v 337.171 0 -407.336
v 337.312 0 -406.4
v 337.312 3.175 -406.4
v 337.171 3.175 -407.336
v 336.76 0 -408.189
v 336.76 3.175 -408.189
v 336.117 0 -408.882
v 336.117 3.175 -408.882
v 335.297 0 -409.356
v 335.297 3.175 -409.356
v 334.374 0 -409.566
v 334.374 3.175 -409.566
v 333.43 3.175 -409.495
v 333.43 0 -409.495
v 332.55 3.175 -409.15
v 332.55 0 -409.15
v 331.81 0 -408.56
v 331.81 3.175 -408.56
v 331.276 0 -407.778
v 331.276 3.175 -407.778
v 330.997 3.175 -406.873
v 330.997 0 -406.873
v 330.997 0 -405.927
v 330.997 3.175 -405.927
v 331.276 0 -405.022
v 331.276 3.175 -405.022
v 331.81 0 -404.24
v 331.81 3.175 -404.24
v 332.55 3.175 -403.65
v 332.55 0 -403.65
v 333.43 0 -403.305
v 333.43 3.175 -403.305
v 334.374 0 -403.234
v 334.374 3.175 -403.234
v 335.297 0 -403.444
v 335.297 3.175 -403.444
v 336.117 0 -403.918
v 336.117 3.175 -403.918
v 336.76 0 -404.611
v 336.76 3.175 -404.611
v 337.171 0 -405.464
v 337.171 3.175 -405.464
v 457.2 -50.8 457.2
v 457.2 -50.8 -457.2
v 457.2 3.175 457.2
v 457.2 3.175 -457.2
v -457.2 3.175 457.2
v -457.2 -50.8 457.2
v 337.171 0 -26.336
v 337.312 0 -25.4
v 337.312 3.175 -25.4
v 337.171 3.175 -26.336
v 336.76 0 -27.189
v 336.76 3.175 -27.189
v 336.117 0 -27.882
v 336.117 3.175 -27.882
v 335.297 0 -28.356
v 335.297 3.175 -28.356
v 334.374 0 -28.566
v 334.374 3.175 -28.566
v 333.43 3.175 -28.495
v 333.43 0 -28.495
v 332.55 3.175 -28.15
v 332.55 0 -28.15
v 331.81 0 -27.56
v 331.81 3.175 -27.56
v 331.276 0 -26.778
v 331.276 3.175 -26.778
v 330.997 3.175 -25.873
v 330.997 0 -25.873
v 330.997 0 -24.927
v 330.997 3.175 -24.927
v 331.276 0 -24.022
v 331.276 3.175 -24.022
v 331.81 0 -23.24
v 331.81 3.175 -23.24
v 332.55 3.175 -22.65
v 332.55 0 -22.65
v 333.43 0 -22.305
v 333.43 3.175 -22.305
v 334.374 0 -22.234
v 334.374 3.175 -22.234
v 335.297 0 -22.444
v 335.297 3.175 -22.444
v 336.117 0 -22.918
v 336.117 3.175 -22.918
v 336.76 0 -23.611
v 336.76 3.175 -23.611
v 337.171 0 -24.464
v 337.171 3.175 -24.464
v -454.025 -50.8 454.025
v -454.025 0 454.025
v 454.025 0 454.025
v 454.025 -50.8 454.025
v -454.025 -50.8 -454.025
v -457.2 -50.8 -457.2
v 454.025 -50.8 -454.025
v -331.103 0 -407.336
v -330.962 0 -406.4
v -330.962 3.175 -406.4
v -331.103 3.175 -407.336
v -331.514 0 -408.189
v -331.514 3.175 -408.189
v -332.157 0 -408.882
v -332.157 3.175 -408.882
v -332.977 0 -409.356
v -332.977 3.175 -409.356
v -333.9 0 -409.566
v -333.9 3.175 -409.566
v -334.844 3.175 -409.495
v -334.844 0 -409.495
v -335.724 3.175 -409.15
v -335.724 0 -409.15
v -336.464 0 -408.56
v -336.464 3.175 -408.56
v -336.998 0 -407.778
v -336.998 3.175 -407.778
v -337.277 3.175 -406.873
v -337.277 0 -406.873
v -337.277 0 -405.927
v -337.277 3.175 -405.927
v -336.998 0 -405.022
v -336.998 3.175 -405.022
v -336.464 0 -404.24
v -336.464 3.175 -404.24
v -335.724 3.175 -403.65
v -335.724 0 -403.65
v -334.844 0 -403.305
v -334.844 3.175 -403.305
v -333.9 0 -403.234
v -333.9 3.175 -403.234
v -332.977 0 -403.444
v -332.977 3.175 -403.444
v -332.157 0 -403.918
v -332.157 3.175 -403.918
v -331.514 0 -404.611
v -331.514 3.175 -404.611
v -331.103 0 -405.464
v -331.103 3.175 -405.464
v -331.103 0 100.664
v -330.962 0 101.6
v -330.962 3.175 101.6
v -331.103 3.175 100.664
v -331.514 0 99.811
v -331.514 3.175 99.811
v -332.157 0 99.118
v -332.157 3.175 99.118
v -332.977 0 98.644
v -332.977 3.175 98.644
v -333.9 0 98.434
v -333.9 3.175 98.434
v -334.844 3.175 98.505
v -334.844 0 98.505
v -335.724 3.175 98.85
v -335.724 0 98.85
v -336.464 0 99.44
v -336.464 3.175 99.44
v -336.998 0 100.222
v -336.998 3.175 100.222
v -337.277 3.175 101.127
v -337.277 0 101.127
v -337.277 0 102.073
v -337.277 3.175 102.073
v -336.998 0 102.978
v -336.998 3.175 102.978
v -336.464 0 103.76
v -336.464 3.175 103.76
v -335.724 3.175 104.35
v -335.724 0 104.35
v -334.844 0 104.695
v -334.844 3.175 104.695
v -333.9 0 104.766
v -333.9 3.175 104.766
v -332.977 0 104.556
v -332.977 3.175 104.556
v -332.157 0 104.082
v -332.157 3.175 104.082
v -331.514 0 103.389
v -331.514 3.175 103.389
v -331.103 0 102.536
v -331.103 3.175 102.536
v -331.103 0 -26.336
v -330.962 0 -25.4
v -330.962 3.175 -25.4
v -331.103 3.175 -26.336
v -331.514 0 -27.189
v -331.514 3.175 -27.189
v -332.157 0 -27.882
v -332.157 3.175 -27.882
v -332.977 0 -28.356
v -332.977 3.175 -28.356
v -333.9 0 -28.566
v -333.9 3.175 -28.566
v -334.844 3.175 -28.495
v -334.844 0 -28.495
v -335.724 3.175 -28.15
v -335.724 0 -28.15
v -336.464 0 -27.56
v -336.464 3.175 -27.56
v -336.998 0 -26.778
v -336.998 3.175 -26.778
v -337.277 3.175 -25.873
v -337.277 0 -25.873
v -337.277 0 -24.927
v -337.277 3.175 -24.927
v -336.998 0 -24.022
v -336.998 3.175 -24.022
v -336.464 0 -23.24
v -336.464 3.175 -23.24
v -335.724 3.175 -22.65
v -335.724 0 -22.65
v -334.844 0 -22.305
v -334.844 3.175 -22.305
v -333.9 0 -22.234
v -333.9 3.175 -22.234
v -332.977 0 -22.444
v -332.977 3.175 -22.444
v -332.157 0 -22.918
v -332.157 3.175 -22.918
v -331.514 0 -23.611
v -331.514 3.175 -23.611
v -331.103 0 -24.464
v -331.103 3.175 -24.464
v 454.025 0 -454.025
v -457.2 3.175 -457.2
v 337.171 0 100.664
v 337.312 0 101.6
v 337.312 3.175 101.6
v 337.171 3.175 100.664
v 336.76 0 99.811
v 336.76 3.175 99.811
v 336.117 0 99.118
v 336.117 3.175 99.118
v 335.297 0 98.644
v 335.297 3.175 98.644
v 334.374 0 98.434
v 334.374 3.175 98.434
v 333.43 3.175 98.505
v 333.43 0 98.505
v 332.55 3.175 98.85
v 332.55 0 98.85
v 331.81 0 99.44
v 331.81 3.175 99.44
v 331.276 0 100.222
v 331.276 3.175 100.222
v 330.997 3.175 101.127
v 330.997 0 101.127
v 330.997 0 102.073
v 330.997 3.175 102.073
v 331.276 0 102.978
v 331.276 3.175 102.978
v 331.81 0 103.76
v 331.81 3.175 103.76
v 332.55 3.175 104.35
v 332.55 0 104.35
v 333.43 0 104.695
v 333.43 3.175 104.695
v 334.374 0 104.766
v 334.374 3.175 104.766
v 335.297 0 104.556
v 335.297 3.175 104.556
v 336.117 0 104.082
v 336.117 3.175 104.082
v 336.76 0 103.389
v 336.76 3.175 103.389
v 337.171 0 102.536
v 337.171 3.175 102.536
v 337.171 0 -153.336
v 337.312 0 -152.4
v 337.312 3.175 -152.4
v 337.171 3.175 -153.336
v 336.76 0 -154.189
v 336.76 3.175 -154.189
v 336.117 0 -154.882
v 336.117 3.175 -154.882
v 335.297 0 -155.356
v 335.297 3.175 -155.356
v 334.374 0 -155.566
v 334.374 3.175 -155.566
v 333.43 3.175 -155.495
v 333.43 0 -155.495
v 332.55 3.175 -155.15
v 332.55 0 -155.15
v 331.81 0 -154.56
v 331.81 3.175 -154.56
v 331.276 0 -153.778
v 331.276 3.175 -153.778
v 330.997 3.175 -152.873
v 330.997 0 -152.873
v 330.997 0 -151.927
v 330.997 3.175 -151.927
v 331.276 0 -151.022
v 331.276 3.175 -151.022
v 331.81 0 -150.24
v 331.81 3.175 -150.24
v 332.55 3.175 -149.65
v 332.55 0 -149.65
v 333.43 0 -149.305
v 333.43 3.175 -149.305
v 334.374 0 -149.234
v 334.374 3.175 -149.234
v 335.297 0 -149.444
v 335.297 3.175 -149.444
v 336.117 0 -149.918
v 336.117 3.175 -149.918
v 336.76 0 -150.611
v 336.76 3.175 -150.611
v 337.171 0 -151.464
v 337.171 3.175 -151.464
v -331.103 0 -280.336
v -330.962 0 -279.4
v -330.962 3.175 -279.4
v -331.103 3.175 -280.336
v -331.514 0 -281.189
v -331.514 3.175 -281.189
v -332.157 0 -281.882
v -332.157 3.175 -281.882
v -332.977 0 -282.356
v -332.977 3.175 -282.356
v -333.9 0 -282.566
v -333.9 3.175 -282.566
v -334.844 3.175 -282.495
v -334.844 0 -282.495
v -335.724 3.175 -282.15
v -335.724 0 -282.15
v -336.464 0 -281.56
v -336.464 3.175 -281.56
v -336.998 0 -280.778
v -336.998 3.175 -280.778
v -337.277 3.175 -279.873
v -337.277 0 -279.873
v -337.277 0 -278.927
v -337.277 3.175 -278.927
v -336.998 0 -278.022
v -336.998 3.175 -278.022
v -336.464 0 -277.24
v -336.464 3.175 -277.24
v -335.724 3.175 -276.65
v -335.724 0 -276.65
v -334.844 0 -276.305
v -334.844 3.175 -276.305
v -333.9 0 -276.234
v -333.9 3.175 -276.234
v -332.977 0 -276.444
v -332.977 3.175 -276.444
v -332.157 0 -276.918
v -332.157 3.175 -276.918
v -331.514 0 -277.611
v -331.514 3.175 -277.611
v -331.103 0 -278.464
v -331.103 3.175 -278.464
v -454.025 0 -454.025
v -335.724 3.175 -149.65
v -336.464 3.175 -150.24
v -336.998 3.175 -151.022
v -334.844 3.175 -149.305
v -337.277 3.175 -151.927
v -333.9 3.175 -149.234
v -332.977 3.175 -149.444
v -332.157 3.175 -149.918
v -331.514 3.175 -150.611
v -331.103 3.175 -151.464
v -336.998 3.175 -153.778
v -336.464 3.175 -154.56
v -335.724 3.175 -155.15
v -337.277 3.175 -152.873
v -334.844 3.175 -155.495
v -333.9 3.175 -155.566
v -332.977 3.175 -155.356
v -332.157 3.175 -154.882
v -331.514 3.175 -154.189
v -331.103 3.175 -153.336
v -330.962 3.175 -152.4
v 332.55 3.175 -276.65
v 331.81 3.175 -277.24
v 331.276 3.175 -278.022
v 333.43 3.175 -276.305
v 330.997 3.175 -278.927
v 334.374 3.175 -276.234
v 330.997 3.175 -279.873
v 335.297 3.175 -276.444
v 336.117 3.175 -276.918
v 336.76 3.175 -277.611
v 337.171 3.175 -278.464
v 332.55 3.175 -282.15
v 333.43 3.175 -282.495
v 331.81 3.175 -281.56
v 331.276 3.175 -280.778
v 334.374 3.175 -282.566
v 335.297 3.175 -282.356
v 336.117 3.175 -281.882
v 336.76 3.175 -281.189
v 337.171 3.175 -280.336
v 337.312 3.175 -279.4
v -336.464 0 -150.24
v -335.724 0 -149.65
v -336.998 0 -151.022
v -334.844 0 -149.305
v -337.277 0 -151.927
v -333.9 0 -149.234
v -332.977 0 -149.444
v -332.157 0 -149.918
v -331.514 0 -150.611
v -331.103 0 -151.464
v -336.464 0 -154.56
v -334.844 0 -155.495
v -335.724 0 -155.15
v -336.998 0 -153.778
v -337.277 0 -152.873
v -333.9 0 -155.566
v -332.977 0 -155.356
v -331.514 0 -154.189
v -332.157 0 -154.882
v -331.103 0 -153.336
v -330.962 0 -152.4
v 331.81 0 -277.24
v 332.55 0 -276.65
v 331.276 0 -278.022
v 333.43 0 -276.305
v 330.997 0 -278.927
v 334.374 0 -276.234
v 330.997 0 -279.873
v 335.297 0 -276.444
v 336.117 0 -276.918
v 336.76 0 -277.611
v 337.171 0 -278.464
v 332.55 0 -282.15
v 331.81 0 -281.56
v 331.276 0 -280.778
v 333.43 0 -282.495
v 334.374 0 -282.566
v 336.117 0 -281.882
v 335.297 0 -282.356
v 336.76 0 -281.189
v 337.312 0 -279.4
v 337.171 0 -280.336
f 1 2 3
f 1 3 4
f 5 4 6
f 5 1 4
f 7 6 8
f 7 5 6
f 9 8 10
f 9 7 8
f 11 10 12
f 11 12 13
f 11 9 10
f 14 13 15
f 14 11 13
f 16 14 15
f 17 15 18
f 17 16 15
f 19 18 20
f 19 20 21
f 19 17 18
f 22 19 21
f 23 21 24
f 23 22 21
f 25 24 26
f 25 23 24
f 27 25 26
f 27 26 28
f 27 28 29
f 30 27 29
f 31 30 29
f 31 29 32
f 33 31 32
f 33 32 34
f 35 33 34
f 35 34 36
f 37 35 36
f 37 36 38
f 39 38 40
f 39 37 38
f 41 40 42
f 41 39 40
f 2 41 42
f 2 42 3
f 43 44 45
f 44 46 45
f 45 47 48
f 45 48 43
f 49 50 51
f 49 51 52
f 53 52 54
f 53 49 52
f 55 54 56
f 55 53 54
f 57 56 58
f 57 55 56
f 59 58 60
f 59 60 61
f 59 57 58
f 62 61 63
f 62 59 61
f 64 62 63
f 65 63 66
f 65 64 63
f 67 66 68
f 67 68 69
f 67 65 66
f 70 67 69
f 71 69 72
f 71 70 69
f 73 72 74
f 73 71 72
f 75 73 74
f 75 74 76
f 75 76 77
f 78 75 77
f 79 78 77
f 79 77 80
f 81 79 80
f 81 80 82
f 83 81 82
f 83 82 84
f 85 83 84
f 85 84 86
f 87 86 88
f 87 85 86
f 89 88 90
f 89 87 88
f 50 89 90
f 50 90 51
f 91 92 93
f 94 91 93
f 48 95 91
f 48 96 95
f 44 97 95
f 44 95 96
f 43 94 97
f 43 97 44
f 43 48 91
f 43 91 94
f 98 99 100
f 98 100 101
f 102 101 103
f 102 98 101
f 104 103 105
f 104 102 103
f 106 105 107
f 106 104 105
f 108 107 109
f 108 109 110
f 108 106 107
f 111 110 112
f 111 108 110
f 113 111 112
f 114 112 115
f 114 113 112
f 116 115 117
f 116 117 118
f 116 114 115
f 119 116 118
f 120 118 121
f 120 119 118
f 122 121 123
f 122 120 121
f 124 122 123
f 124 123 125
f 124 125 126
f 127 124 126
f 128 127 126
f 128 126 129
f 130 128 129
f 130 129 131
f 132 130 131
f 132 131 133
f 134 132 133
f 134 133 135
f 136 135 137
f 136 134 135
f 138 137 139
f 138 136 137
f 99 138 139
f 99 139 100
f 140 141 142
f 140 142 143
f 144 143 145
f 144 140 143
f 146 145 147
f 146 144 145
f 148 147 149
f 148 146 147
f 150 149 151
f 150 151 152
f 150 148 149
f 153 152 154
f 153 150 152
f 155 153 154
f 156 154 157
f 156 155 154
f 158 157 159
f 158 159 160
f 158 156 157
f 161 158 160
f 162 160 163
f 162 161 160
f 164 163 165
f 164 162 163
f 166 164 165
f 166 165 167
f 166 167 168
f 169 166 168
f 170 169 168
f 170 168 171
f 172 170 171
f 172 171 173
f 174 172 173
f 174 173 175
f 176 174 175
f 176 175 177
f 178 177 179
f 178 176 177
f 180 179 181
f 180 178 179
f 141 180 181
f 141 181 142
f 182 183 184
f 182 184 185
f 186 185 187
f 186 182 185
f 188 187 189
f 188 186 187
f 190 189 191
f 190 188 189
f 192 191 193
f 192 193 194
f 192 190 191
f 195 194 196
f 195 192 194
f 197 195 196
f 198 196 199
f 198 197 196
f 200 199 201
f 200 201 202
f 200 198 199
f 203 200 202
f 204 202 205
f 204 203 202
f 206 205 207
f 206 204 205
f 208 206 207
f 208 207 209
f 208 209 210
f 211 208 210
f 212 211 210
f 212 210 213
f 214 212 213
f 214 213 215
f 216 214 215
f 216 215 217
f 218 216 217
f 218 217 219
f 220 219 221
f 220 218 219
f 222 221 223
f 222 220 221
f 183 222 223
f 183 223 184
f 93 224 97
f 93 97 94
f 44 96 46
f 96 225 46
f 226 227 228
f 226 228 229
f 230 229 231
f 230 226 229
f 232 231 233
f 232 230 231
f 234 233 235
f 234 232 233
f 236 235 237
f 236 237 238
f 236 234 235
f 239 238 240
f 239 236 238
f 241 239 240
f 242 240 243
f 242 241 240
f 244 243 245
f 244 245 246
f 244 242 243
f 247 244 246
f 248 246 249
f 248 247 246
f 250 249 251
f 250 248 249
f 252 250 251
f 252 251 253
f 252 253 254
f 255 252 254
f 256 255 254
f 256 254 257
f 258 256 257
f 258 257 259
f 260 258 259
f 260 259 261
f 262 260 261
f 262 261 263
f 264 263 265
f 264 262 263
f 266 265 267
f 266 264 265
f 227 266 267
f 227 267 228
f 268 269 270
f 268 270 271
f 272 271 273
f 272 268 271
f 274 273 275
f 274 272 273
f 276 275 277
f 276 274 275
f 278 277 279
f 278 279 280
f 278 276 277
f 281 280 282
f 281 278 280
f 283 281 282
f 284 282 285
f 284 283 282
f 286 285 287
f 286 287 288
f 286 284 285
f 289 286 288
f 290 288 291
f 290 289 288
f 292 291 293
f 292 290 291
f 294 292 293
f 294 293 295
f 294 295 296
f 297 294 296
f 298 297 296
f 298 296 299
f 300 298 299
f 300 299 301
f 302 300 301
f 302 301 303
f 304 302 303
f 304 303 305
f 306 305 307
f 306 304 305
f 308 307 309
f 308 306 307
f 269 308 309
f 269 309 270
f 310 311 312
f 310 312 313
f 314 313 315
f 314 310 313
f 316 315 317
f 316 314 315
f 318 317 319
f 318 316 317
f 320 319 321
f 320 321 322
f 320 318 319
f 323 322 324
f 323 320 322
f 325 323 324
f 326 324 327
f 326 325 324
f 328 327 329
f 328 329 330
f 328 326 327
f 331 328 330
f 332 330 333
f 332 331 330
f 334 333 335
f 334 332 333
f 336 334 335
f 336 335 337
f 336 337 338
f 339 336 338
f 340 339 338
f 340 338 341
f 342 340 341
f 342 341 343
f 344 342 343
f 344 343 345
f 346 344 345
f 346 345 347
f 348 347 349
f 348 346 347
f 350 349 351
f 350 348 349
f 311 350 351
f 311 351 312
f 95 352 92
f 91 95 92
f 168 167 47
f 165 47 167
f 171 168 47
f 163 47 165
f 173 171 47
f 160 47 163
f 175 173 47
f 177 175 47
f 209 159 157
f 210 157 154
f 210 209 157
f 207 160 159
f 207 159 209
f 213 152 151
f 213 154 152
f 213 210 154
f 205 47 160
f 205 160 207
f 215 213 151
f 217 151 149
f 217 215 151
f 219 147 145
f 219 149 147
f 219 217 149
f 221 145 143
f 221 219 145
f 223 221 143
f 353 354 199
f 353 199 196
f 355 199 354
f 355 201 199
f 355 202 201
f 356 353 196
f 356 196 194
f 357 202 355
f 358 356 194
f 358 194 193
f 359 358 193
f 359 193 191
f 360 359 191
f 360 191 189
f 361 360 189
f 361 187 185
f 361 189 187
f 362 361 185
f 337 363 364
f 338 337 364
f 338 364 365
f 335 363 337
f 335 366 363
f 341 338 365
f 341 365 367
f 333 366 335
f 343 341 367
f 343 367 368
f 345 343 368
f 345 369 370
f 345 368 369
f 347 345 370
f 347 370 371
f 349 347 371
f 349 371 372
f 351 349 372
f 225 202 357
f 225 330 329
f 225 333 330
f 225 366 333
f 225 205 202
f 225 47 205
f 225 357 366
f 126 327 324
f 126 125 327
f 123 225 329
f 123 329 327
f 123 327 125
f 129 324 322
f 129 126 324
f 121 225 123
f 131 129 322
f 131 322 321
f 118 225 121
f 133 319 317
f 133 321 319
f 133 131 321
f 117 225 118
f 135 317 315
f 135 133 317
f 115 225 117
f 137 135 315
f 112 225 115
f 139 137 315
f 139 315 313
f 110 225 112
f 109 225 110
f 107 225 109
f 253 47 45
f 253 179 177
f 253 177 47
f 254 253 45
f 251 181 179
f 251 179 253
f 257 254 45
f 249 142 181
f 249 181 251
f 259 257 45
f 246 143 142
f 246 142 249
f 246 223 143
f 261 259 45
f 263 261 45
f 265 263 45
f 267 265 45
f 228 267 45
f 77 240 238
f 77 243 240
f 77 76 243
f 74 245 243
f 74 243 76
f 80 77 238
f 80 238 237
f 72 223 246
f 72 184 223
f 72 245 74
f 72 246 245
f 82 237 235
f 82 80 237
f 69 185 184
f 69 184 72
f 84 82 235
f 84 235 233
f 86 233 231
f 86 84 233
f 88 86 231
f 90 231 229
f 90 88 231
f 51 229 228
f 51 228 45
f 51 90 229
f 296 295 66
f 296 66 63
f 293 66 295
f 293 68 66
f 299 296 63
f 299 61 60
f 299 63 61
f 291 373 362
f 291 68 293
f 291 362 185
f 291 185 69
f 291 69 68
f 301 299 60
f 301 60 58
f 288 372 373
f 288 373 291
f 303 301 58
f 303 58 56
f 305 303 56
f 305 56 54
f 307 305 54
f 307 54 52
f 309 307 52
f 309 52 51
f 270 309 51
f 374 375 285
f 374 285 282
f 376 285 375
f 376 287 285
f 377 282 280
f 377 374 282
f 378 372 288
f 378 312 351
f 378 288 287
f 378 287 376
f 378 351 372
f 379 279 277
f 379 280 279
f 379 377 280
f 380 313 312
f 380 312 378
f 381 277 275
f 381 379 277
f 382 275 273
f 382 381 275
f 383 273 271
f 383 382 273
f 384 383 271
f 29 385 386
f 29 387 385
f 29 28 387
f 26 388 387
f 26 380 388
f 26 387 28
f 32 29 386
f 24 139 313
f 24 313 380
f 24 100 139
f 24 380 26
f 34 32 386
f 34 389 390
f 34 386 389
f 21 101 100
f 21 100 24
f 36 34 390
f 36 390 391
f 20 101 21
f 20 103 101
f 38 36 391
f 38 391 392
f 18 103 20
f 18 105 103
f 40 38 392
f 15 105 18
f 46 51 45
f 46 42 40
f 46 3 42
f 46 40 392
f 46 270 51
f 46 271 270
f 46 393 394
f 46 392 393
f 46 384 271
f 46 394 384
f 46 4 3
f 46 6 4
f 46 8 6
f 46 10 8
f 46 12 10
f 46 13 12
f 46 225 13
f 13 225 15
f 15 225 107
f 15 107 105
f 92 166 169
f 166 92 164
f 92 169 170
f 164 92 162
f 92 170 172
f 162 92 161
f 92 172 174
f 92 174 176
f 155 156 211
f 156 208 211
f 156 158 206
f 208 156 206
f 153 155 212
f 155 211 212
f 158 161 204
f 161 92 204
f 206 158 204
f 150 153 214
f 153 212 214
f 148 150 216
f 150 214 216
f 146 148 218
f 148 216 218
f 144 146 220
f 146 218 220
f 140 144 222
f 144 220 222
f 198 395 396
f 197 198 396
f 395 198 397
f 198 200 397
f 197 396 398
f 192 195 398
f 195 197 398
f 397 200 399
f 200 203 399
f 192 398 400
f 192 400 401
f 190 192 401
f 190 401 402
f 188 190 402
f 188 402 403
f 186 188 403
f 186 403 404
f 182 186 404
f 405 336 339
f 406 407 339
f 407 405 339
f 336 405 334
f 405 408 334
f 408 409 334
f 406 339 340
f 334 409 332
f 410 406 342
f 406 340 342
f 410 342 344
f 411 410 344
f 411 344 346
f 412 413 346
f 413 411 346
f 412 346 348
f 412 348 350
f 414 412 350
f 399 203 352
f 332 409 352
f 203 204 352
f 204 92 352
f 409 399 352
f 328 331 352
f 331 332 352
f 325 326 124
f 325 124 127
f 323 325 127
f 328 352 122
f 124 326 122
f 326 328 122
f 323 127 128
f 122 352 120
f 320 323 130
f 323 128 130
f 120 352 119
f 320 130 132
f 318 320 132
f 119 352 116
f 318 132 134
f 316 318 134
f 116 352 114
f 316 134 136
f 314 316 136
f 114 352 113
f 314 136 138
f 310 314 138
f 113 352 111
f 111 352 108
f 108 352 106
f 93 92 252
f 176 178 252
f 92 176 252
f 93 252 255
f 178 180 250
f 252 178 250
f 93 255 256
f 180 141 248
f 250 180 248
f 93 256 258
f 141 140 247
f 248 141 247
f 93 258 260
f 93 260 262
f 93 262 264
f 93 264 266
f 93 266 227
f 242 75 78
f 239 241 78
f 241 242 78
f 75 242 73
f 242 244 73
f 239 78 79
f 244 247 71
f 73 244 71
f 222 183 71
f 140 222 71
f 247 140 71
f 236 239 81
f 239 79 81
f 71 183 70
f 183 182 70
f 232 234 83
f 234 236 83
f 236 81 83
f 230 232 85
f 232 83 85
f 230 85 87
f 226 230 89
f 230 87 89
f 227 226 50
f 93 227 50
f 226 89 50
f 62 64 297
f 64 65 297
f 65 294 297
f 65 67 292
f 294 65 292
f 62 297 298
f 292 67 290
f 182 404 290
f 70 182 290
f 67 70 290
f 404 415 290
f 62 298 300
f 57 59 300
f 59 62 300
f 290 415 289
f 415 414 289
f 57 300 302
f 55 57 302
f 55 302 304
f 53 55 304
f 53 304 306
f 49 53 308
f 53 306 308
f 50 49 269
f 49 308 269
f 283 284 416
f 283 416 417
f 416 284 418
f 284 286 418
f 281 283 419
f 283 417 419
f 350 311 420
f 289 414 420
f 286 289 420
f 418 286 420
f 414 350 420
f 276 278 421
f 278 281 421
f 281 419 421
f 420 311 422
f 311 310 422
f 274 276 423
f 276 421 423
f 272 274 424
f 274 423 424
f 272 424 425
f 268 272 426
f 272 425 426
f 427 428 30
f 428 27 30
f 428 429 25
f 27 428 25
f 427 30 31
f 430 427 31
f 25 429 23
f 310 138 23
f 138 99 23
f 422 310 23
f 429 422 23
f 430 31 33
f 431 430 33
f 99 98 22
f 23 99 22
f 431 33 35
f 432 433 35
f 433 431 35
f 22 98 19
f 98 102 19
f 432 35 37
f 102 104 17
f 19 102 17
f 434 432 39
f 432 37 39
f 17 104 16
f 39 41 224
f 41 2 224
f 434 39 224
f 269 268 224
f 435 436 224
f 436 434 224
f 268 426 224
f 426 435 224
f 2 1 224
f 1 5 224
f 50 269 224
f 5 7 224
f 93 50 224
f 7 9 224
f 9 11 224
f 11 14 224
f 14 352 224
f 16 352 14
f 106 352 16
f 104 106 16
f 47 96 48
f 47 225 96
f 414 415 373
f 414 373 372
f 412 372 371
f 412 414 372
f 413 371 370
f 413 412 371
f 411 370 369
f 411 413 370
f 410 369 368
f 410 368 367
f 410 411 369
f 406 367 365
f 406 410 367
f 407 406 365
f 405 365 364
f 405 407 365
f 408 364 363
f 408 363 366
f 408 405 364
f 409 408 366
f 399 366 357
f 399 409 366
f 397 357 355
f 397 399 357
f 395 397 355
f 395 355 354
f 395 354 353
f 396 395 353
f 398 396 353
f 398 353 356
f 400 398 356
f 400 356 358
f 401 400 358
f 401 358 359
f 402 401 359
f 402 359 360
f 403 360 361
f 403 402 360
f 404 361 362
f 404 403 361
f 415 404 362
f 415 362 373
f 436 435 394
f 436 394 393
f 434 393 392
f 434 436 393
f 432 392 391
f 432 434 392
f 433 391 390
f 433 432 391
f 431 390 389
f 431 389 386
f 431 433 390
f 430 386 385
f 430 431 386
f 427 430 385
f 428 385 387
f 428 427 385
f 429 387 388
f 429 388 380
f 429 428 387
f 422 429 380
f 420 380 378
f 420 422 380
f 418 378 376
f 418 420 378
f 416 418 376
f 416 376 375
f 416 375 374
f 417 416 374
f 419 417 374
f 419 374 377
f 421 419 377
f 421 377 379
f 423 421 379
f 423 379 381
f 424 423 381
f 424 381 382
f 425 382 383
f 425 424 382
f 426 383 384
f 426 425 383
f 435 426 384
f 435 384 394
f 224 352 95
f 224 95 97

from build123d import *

# Parameters (mm, degrees)
SKETCH1_W           = 914.4
SKETCH1_H           = 914.4
SKETCH1_R           = 3.175
BOSS_EXTRUDE1_DEPTH = 3.175
SKETCH4_W           = 914.4
SKETCH4_H           = 914.4
SKETCH4_W_2         = 908.05
SKETCH4_H_2         = 908.05
BOSS_EXTRUDE2_DEPTH = 50.8


with BuildPart() as part:
    # Sketch1 → Boss-Extrude1 (new body)
    with BuildSketch(Plane(origin=(0, 0, 0), x_dir=(1, 0, 0), z_dir=(0, 1, 0))):
        Rectangle(SKETCH1_W, SKETCH1_H)
        with Locations((-334.137, 406.4)):
            Circle(SKETCH1_R, mode=Mode.SUBTRACT)
        with Locations((-334.137, 279.4)):
            Circle(SKETCH1_R, mode=Mode.SUBTRACT)
        with Locations((-334.137, 152.4)):
            Circle(SKETCH1_R, mode=Mode.SUBTRACT)
        with Locations((-334.137, 25.4)):
            Circle(SKETCH1_R, mode=Mode.SUBTRACT)
        with Locations((-334.137, -101.6)):
            Circle(SKETCH1_R, mode=Mode.SUBTRACT)
        with Locations((334.137, -101.6)):
            Circle(SKETCH1_R, mode=Mode.SUBTRACT)
        with Locations((334.137, 25.4)):
            Circle(SKETCH1_R, mode=Mode.SUBTRACT)
        with Locations((334.137, 152.4)):
            Circle(SKETCH1_R, mode=Mode.SUBTRACT)
        with Locations((334.137, 279.4)):
            Circle(SKETCH1_R, mode=Mode.SUBTRACT)
        with Locations((334.137, 406.4)):
            Circle(SKETCH1_R, mode=Mode.SUBTRACT)
    extrude(amount=BOSS_EXTRUDE1_DEPTH)

    # Sketch4 → Boss-Extrude2 (add)
    with BuildSketch(Plane.XZ):
        Rectangle(SKETCH4_W, SKETCH4_H)
        Rectangle(SKETCH4_W_2, SKETCH4_H_2, mode=Mode.SUBTRACT)
    extrude(amount=BOSS_EXTRUDE2_DEPTH)


solid = part.part
